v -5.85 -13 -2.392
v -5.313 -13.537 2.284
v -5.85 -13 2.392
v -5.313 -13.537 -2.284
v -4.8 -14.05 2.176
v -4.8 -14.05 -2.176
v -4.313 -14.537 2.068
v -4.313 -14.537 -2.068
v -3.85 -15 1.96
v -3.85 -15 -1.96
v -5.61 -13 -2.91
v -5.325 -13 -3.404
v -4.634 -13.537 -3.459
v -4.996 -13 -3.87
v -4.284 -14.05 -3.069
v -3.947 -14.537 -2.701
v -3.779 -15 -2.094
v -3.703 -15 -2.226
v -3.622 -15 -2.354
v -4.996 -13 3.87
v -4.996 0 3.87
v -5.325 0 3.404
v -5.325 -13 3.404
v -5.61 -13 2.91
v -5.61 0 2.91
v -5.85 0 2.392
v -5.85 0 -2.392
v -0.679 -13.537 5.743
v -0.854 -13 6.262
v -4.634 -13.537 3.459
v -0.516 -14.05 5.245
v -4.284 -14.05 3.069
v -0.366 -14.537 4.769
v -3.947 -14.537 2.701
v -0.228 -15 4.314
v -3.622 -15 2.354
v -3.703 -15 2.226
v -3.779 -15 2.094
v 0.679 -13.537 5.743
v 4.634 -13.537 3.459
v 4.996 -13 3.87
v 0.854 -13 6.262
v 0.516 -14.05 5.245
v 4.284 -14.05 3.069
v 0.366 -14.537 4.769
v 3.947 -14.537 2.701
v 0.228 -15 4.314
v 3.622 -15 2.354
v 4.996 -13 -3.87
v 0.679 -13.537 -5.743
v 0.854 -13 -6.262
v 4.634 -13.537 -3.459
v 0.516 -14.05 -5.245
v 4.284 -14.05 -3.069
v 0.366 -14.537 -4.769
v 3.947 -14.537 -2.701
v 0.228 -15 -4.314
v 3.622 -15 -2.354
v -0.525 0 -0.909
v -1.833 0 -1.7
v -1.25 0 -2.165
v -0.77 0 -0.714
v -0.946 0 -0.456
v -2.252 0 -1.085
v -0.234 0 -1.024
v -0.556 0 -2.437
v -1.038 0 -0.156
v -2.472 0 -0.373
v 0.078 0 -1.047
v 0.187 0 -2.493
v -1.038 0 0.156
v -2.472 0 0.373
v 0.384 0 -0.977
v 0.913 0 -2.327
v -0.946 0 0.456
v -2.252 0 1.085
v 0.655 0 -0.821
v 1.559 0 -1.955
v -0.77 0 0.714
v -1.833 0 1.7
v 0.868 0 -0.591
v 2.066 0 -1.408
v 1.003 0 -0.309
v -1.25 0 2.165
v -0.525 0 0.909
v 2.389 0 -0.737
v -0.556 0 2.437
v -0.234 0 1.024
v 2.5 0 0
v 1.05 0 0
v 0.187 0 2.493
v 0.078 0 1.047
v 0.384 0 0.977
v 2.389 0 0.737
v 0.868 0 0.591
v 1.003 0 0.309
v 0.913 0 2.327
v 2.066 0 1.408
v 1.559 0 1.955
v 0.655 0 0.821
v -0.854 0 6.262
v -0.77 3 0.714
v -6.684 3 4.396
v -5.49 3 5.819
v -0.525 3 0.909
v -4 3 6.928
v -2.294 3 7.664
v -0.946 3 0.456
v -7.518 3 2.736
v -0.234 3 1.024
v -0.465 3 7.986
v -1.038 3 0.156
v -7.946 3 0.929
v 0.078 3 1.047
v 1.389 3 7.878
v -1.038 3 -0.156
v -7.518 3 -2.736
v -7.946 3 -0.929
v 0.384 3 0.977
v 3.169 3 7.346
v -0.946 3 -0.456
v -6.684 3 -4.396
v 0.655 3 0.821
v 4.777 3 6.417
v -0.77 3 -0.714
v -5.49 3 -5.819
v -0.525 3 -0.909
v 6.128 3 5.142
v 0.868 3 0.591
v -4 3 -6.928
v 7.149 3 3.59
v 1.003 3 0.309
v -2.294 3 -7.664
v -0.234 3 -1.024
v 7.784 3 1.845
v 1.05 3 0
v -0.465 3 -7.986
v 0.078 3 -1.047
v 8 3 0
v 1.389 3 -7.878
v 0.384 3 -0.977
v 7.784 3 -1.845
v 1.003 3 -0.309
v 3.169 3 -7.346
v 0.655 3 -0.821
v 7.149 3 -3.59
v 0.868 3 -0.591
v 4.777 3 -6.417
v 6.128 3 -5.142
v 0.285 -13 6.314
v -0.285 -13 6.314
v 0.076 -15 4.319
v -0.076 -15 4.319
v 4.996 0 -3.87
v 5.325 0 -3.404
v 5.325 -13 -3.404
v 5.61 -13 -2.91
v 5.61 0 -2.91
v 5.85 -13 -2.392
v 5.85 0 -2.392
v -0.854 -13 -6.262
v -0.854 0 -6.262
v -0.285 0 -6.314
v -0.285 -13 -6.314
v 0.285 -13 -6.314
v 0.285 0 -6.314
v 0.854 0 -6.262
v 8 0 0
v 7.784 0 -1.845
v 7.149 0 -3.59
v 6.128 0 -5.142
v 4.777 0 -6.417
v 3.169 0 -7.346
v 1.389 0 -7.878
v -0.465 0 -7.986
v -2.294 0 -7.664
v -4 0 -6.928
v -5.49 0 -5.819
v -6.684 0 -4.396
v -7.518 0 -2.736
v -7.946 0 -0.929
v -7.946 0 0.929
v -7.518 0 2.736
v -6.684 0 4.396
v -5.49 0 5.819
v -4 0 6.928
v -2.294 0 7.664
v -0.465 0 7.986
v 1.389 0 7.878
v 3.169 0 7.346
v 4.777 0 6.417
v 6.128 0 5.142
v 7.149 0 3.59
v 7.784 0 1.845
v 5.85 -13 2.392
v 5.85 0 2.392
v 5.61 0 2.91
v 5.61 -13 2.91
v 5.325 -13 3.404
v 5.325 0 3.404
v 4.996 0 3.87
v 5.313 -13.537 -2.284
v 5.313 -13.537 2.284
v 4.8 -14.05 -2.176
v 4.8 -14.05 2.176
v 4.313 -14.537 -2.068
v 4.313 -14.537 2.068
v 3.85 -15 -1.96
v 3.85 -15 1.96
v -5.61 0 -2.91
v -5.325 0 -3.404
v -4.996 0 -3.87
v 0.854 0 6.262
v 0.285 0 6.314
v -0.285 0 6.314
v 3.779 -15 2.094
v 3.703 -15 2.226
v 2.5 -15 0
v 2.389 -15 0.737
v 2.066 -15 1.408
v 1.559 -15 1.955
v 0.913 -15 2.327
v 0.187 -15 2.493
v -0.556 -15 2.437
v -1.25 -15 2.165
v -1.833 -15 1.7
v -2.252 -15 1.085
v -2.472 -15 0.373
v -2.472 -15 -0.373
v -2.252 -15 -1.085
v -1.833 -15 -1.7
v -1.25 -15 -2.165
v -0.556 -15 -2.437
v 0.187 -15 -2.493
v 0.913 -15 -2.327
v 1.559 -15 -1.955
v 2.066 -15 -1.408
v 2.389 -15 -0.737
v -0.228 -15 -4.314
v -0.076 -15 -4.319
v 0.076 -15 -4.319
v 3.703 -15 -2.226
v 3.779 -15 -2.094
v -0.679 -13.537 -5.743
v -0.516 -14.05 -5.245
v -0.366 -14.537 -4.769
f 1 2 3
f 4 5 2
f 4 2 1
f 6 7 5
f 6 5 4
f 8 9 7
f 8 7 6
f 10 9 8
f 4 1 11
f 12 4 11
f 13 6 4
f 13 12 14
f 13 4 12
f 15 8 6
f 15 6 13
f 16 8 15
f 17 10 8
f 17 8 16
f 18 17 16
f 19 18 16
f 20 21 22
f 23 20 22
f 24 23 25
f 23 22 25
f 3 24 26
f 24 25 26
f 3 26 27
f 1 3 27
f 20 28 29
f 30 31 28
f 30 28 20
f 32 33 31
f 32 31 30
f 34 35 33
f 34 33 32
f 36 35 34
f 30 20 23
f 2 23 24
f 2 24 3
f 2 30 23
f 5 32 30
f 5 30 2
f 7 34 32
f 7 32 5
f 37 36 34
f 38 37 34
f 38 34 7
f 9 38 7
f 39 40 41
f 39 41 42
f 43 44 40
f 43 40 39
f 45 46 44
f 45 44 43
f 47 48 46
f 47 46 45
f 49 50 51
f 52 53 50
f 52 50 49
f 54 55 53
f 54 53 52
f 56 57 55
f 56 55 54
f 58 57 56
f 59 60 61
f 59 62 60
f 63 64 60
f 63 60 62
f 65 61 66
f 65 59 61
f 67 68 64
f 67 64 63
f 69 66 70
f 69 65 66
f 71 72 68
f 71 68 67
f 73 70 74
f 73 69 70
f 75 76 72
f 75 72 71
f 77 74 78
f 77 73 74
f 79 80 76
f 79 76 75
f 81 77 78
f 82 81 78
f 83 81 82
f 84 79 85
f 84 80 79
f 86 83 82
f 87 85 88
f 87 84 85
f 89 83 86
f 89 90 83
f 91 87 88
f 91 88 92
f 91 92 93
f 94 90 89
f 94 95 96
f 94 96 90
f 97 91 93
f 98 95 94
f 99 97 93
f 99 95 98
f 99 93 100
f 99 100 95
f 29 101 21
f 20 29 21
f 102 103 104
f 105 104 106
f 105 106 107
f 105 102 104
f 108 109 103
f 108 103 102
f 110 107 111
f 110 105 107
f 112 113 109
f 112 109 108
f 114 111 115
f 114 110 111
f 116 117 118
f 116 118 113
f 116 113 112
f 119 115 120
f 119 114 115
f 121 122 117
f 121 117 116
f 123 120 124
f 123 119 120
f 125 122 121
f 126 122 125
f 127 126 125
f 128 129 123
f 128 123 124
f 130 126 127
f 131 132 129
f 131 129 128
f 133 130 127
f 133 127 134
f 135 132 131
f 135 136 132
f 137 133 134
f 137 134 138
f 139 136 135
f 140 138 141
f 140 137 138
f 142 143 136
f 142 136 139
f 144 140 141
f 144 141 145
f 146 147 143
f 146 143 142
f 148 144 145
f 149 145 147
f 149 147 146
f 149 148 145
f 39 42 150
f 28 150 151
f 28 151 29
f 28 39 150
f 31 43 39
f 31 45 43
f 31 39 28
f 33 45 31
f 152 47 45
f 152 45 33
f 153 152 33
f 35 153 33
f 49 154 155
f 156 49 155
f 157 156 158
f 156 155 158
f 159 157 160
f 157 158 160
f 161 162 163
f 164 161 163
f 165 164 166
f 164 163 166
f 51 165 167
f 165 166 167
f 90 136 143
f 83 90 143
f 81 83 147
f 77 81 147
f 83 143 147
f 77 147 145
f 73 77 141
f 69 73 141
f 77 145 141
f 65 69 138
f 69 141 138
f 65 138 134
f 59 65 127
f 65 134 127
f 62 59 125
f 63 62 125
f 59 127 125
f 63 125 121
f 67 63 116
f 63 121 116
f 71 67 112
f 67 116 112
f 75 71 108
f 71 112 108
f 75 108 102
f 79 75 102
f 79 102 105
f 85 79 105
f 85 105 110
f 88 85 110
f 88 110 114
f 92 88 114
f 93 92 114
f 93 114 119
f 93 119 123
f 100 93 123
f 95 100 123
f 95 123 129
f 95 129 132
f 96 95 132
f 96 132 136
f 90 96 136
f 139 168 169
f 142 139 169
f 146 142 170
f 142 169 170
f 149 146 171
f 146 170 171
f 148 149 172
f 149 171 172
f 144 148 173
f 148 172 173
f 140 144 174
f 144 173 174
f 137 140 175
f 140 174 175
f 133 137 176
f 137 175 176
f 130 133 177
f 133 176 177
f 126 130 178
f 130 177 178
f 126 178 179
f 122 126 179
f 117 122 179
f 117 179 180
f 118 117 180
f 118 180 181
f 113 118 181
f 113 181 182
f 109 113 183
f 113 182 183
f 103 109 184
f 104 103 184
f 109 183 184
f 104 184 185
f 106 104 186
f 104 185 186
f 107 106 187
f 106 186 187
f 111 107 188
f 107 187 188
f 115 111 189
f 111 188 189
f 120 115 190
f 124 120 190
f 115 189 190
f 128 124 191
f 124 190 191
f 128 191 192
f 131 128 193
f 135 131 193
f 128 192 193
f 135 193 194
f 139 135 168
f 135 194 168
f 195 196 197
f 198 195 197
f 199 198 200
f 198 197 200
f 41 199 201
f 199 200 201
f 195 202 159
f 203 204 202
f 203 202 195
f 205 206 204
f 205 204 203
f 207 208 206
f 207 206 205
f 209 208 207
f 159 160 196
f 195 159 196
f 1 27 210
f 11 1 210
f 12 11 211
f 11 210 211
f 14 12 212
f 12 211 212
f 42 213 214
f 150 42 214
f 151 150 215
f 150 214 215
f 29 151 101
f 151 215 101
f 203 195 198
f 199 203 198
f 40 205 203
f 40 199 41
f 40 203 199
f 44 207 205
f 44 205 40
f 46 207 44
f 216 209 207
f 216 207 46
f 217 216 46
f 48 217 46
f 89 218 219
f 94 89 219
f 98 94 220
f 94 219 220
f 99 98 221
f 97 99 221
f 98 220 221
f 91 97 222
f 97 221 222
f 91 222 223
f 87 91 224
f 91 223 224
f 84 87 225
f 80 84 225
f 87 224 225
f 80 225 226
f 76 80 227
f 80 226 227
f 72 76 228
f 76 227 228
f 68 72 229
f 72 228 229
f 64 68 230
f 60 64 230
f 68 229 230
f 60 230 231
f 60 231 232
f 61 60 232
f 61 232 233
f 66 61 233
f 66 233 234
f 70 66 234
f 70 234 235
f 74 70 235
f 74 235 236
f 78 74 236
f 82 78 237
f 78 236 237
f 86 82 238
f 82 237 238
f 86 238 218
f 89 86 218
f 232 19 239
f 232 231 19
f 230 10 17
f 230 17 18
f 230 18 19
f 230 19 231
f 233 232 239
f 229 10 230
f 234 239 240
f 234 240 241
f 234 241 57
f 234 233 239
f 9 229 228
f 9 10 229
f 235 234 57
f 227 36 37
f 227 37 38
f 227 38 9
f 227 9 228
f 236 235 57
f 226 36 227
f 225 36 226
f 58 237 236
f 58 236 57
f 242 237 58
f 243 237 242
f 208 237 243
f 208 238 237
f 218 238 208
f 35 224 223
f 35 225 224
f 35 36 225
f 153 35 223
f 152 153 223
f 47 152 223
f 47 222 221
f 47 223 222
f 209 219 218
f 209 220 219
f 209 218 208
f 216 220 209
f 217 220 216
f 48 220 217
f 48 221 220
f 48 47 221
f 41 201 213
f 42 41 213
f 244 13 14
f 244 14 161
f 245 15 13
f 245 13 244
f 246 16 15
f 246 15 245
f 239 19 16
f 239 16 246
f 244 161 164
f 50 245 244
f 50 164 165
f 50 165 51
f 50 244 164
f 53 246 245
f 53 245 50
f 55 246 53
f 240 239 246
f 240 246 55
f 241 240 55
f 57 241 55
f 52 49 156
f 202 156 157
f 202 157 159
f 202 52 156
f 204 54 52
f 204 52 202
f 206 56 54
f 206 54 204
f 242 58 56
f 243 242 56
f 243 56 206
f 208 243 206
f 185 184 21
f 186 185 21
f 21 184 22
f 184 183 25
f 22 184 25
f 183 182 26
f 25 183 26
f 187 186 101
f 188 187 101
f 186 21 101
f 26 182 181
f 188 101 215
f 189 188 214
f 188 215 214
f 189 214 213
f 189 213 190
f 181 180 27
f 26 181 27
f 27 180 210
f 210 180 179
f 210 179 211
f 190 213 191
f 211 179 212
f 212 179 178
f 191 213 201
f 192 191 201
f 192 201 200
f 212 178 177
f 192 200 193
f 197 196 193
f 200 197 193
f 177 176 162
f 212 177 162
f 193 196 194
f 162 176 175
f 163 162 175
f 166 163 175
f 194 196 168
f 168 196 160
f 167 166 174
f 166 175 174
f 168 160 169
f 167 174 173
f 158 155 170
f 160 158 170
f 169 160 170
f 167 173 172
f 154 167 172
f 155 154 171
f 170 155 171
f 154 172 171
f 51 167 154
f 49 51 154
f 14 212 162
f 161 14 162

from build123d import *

# Parameters (mm, degrees)
SKETCH1_R           = 8
BOSS_EXTRUDE1_DEPTH = 3
BOSS_EXTRUDE2_DEPTH = 15
CHAMFER1_SIZE       = 2
SKETCH10_R          = 2.5
CUT_EXTRUDE1_DEPTH  = 15
SKETCH11_R          = 1.05
CUT_EXTRUDE3_DEPTH  = 19


with BuildPart() as part:
    # Sketch1 → Boss-Extrude1 (new body)
    with BuildSketch(Plane(origin=(0, 0, 0), x_dir=(1, 0, 0), z_dir=(0, 1, 0))):
        Circle(SKETCH1_R)
    extrude(amount=BOSS_EXTRUDE1_DEPTH)

    # Sketch9 → Boss-Extrude2 (add)
    with BuildSketch(Plane.XZ):
        with BuildLine():
            ThreePointArc((-0.853786588, -6.262064233), (0, -6.32), (0.853786588, -6.262064233))
            Line((0.853786588, -6.262064233), (4.996213412, -3.870432991))
            ThreePointArc((4.996213412, -3.870432991), (5.473280552, -3.16), (5.85, -2.391631242))
            Line((5.85, -2.391631242), (5.85, 2.391631242))
            ThreePointArc((5.85, 2.391631242), (5.473280552, 3.16), (4.996213412, 3.870432991))
            Line((4.996213412, 3.870432991), (0.853786588, 6.262064233))
            ThreePointArc((0.853786588, 6.262064233), (0, 6.32), (-0.853786588, 6.262064233))
            Line((-0.853786588, 6.262064233), (-4.996213412, 3.870432991))
            ThreePointArc((-4.996213412, 3.870432991), (-5.473280552, 3.16), (-5.85, 2.391631242))
            Line((-5.85, 2.391631242), (-5.85, -2.391631242))
            ThreePointArc((-5.85, -2.391631242), (-5.473280552, -3.16), (-4.996213412, -3.870432991))
            Line((-4.996213412, -3.870432991), (-0.853786588, -6.262064233))
        make_face()
    extrude(amount=BOSS_EXTRUDE2_DEPTH)

    # Chamfer1
    chamfer1_edges = [part.edges().sort_by_distance(p)[0] for p in [
        (2.925, -15, -5.066248612),
        (5.473280552, -15, -3.16),
        (5.85, -15, 0),
        (5.473280552, -15, 3.16),
        (2.925, -15, 5.066248612),
        (0, -15, 6.32),
        (-2.925, -15, 5.066248612),
        (-5.473280552, -15, 3.16),
        (-5.85, -15, 0),
        (-5.473280552, -15, -3.16),
        (-2.925, -15, -5.066248612),
        (0, -15, -6.32),
    ]]
    chamfer(chamfer1_edges, length=CHAMFER1_SIZE)

    # Sketch10 → Cut-Extrude1 (cut)
    with BuildSketch(Plane.XZ.offset(15)):
        Circle(SKETCH10_R)
    extrude(amount=-CUT_EXTRUDE1_DEPTH, mode=Mode.SUBTRACT)

    # Sketch11 → Cut-Extrude3 (cut, through all)
    with BuildSketch(Plane(origin=(0, 3, 0), x_dir=(1, 0, 0), z_dir=(0, 1, 0))):
        Circle(SKETCH11_R)
    extrude(amount=-CUT_EXTRUDE3_DEPTH, mode=Mode.SUBTRACT)


solid = part.part
